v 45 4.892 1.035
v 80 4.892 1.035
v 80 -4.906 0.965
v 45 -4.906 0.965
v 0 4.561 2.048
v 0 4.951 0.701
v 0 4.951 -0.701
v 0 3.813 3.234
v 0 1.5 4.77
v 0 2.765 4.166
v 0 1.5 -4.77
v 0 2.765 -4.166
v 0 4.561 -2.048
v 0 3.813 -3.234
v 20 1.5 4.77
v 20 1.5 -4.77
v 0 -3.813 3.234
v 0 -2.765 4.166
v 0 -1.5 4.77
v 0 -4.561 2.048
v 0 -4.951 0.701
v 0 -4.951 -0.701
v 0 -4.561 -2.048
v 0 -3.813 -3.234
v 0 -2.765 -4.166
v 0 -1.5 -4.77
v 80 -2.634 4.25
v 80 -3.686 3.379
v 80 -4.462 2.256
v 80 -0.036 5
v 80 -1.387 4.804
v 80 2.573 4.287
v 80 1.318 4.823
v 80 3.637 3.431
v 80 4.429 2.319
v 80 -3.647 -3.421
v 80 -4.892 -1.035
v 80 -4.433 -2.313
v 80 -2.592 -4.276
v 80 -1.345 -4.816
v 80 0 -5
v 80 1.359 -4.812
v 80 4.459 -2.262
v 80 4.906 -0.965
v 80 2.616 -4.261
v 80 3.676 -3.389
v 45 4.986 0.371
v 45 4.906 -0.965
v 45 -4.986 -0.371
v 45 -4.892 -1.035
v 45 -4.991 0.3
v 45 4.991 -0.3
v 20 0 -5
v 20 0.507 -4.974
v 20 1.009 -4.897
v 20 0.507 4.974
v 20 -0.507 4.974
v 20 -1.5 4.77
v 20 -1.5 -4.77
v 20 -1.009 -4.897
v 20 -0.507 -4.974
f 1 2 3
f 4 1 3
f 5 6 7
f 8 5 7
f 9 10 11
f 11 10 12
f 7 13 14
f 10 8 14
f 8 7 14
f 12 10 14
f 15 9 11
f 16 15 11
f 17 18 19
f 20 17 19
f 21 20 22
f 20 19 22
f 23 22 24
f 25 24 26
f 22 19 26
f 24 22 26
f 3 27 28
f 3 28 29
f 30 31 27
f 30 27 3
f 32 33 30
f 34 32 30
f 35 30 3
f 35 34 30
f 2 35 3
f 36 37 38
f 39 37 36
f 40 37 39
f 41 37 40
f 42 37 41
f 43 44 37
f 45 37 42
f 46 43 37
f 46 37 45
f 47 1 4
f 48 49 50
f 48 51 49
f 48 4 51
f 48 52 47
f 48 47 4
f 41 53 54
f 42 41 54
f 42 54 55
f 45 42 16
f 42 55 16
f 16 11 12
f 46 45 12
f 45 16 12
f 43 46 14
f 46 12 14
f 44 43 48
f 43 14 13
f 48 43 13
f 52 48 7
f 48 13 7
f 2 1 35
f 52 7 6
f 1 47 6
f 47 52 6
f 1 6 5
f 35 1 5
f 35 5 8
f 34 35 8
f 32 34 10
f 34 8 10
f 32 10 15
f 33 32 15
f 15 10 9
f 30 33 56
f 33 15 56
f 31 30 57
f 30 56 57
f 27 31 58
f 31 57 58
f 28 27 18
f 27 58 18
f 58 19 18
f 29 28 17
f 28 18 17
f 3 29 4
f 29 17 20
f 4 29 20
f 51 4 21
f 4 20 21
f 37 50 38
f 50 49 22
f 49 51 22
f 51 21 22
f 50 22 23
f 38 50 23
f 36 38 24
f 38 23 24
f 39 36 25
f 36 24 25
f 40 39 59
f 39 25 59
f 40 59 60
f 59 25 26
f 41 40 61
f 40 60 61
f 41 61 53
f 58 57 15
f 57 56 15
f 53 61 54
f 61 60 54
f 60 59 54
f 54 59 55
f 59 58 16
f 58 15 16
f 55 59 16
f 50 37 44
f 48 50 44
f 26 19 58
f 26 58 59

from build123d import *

# Parameters (mm, degrees)
SKETCH_1_R          = 5
EXTRUDE_1_DEPTH     = 80
SKETCH_2_W          = 13.601077261
SKETCH_2_H          = 3
CUT_EXTRUDE_1_DEPTH = 20
CUT_EXTRUDE_2_DEPTH = 35


with BuildPart() as part:
    # 草图1 → 凸台-拉伸1 (new body)
    with BuildSketch(Plane(origin=(0, 0, 0), x_dir=(0, 0, -1), z_dir=(1, 0, 0))):
        Circle(SKETCH_1_R)
    extrude(amount=EXTRUDE_1_DEPTH)

    # 草图2 → 切除-拉伸1 (cut)
    with BuildSketch(Plane(origin=(0, 0, 0), x_dir=(0, 0, -1), z_dir=(1, 0, 0))):
        with Locations((0.220015061, 0)):
            Rectangle(SKETCH_2_W, SKETCH_2_H)
    extrude(amount=CUT_EXTRUDE_1_DEPTH, mode=Mode.SUBTRACT)

    # 草图3 → 切除-拉伸2 (cut)
    with BuildSketch(Plane(origin=(80, 0, 0), x_dir=(0, 0, -1), z_dir=(1, 0, 0))):
        Polygon((-0.999943638, -0.009058055), (-0.914206616, -12.008751766), (1.085793384, -11.994461897), (0.91431934, 12.004925525), (-1.08568066, 11.990635657), align=None)
    extrude(amount=-CUT_EXTRUDE_2_DEPTH, mode=Mode.SUBTRACT)


solid = part.part
